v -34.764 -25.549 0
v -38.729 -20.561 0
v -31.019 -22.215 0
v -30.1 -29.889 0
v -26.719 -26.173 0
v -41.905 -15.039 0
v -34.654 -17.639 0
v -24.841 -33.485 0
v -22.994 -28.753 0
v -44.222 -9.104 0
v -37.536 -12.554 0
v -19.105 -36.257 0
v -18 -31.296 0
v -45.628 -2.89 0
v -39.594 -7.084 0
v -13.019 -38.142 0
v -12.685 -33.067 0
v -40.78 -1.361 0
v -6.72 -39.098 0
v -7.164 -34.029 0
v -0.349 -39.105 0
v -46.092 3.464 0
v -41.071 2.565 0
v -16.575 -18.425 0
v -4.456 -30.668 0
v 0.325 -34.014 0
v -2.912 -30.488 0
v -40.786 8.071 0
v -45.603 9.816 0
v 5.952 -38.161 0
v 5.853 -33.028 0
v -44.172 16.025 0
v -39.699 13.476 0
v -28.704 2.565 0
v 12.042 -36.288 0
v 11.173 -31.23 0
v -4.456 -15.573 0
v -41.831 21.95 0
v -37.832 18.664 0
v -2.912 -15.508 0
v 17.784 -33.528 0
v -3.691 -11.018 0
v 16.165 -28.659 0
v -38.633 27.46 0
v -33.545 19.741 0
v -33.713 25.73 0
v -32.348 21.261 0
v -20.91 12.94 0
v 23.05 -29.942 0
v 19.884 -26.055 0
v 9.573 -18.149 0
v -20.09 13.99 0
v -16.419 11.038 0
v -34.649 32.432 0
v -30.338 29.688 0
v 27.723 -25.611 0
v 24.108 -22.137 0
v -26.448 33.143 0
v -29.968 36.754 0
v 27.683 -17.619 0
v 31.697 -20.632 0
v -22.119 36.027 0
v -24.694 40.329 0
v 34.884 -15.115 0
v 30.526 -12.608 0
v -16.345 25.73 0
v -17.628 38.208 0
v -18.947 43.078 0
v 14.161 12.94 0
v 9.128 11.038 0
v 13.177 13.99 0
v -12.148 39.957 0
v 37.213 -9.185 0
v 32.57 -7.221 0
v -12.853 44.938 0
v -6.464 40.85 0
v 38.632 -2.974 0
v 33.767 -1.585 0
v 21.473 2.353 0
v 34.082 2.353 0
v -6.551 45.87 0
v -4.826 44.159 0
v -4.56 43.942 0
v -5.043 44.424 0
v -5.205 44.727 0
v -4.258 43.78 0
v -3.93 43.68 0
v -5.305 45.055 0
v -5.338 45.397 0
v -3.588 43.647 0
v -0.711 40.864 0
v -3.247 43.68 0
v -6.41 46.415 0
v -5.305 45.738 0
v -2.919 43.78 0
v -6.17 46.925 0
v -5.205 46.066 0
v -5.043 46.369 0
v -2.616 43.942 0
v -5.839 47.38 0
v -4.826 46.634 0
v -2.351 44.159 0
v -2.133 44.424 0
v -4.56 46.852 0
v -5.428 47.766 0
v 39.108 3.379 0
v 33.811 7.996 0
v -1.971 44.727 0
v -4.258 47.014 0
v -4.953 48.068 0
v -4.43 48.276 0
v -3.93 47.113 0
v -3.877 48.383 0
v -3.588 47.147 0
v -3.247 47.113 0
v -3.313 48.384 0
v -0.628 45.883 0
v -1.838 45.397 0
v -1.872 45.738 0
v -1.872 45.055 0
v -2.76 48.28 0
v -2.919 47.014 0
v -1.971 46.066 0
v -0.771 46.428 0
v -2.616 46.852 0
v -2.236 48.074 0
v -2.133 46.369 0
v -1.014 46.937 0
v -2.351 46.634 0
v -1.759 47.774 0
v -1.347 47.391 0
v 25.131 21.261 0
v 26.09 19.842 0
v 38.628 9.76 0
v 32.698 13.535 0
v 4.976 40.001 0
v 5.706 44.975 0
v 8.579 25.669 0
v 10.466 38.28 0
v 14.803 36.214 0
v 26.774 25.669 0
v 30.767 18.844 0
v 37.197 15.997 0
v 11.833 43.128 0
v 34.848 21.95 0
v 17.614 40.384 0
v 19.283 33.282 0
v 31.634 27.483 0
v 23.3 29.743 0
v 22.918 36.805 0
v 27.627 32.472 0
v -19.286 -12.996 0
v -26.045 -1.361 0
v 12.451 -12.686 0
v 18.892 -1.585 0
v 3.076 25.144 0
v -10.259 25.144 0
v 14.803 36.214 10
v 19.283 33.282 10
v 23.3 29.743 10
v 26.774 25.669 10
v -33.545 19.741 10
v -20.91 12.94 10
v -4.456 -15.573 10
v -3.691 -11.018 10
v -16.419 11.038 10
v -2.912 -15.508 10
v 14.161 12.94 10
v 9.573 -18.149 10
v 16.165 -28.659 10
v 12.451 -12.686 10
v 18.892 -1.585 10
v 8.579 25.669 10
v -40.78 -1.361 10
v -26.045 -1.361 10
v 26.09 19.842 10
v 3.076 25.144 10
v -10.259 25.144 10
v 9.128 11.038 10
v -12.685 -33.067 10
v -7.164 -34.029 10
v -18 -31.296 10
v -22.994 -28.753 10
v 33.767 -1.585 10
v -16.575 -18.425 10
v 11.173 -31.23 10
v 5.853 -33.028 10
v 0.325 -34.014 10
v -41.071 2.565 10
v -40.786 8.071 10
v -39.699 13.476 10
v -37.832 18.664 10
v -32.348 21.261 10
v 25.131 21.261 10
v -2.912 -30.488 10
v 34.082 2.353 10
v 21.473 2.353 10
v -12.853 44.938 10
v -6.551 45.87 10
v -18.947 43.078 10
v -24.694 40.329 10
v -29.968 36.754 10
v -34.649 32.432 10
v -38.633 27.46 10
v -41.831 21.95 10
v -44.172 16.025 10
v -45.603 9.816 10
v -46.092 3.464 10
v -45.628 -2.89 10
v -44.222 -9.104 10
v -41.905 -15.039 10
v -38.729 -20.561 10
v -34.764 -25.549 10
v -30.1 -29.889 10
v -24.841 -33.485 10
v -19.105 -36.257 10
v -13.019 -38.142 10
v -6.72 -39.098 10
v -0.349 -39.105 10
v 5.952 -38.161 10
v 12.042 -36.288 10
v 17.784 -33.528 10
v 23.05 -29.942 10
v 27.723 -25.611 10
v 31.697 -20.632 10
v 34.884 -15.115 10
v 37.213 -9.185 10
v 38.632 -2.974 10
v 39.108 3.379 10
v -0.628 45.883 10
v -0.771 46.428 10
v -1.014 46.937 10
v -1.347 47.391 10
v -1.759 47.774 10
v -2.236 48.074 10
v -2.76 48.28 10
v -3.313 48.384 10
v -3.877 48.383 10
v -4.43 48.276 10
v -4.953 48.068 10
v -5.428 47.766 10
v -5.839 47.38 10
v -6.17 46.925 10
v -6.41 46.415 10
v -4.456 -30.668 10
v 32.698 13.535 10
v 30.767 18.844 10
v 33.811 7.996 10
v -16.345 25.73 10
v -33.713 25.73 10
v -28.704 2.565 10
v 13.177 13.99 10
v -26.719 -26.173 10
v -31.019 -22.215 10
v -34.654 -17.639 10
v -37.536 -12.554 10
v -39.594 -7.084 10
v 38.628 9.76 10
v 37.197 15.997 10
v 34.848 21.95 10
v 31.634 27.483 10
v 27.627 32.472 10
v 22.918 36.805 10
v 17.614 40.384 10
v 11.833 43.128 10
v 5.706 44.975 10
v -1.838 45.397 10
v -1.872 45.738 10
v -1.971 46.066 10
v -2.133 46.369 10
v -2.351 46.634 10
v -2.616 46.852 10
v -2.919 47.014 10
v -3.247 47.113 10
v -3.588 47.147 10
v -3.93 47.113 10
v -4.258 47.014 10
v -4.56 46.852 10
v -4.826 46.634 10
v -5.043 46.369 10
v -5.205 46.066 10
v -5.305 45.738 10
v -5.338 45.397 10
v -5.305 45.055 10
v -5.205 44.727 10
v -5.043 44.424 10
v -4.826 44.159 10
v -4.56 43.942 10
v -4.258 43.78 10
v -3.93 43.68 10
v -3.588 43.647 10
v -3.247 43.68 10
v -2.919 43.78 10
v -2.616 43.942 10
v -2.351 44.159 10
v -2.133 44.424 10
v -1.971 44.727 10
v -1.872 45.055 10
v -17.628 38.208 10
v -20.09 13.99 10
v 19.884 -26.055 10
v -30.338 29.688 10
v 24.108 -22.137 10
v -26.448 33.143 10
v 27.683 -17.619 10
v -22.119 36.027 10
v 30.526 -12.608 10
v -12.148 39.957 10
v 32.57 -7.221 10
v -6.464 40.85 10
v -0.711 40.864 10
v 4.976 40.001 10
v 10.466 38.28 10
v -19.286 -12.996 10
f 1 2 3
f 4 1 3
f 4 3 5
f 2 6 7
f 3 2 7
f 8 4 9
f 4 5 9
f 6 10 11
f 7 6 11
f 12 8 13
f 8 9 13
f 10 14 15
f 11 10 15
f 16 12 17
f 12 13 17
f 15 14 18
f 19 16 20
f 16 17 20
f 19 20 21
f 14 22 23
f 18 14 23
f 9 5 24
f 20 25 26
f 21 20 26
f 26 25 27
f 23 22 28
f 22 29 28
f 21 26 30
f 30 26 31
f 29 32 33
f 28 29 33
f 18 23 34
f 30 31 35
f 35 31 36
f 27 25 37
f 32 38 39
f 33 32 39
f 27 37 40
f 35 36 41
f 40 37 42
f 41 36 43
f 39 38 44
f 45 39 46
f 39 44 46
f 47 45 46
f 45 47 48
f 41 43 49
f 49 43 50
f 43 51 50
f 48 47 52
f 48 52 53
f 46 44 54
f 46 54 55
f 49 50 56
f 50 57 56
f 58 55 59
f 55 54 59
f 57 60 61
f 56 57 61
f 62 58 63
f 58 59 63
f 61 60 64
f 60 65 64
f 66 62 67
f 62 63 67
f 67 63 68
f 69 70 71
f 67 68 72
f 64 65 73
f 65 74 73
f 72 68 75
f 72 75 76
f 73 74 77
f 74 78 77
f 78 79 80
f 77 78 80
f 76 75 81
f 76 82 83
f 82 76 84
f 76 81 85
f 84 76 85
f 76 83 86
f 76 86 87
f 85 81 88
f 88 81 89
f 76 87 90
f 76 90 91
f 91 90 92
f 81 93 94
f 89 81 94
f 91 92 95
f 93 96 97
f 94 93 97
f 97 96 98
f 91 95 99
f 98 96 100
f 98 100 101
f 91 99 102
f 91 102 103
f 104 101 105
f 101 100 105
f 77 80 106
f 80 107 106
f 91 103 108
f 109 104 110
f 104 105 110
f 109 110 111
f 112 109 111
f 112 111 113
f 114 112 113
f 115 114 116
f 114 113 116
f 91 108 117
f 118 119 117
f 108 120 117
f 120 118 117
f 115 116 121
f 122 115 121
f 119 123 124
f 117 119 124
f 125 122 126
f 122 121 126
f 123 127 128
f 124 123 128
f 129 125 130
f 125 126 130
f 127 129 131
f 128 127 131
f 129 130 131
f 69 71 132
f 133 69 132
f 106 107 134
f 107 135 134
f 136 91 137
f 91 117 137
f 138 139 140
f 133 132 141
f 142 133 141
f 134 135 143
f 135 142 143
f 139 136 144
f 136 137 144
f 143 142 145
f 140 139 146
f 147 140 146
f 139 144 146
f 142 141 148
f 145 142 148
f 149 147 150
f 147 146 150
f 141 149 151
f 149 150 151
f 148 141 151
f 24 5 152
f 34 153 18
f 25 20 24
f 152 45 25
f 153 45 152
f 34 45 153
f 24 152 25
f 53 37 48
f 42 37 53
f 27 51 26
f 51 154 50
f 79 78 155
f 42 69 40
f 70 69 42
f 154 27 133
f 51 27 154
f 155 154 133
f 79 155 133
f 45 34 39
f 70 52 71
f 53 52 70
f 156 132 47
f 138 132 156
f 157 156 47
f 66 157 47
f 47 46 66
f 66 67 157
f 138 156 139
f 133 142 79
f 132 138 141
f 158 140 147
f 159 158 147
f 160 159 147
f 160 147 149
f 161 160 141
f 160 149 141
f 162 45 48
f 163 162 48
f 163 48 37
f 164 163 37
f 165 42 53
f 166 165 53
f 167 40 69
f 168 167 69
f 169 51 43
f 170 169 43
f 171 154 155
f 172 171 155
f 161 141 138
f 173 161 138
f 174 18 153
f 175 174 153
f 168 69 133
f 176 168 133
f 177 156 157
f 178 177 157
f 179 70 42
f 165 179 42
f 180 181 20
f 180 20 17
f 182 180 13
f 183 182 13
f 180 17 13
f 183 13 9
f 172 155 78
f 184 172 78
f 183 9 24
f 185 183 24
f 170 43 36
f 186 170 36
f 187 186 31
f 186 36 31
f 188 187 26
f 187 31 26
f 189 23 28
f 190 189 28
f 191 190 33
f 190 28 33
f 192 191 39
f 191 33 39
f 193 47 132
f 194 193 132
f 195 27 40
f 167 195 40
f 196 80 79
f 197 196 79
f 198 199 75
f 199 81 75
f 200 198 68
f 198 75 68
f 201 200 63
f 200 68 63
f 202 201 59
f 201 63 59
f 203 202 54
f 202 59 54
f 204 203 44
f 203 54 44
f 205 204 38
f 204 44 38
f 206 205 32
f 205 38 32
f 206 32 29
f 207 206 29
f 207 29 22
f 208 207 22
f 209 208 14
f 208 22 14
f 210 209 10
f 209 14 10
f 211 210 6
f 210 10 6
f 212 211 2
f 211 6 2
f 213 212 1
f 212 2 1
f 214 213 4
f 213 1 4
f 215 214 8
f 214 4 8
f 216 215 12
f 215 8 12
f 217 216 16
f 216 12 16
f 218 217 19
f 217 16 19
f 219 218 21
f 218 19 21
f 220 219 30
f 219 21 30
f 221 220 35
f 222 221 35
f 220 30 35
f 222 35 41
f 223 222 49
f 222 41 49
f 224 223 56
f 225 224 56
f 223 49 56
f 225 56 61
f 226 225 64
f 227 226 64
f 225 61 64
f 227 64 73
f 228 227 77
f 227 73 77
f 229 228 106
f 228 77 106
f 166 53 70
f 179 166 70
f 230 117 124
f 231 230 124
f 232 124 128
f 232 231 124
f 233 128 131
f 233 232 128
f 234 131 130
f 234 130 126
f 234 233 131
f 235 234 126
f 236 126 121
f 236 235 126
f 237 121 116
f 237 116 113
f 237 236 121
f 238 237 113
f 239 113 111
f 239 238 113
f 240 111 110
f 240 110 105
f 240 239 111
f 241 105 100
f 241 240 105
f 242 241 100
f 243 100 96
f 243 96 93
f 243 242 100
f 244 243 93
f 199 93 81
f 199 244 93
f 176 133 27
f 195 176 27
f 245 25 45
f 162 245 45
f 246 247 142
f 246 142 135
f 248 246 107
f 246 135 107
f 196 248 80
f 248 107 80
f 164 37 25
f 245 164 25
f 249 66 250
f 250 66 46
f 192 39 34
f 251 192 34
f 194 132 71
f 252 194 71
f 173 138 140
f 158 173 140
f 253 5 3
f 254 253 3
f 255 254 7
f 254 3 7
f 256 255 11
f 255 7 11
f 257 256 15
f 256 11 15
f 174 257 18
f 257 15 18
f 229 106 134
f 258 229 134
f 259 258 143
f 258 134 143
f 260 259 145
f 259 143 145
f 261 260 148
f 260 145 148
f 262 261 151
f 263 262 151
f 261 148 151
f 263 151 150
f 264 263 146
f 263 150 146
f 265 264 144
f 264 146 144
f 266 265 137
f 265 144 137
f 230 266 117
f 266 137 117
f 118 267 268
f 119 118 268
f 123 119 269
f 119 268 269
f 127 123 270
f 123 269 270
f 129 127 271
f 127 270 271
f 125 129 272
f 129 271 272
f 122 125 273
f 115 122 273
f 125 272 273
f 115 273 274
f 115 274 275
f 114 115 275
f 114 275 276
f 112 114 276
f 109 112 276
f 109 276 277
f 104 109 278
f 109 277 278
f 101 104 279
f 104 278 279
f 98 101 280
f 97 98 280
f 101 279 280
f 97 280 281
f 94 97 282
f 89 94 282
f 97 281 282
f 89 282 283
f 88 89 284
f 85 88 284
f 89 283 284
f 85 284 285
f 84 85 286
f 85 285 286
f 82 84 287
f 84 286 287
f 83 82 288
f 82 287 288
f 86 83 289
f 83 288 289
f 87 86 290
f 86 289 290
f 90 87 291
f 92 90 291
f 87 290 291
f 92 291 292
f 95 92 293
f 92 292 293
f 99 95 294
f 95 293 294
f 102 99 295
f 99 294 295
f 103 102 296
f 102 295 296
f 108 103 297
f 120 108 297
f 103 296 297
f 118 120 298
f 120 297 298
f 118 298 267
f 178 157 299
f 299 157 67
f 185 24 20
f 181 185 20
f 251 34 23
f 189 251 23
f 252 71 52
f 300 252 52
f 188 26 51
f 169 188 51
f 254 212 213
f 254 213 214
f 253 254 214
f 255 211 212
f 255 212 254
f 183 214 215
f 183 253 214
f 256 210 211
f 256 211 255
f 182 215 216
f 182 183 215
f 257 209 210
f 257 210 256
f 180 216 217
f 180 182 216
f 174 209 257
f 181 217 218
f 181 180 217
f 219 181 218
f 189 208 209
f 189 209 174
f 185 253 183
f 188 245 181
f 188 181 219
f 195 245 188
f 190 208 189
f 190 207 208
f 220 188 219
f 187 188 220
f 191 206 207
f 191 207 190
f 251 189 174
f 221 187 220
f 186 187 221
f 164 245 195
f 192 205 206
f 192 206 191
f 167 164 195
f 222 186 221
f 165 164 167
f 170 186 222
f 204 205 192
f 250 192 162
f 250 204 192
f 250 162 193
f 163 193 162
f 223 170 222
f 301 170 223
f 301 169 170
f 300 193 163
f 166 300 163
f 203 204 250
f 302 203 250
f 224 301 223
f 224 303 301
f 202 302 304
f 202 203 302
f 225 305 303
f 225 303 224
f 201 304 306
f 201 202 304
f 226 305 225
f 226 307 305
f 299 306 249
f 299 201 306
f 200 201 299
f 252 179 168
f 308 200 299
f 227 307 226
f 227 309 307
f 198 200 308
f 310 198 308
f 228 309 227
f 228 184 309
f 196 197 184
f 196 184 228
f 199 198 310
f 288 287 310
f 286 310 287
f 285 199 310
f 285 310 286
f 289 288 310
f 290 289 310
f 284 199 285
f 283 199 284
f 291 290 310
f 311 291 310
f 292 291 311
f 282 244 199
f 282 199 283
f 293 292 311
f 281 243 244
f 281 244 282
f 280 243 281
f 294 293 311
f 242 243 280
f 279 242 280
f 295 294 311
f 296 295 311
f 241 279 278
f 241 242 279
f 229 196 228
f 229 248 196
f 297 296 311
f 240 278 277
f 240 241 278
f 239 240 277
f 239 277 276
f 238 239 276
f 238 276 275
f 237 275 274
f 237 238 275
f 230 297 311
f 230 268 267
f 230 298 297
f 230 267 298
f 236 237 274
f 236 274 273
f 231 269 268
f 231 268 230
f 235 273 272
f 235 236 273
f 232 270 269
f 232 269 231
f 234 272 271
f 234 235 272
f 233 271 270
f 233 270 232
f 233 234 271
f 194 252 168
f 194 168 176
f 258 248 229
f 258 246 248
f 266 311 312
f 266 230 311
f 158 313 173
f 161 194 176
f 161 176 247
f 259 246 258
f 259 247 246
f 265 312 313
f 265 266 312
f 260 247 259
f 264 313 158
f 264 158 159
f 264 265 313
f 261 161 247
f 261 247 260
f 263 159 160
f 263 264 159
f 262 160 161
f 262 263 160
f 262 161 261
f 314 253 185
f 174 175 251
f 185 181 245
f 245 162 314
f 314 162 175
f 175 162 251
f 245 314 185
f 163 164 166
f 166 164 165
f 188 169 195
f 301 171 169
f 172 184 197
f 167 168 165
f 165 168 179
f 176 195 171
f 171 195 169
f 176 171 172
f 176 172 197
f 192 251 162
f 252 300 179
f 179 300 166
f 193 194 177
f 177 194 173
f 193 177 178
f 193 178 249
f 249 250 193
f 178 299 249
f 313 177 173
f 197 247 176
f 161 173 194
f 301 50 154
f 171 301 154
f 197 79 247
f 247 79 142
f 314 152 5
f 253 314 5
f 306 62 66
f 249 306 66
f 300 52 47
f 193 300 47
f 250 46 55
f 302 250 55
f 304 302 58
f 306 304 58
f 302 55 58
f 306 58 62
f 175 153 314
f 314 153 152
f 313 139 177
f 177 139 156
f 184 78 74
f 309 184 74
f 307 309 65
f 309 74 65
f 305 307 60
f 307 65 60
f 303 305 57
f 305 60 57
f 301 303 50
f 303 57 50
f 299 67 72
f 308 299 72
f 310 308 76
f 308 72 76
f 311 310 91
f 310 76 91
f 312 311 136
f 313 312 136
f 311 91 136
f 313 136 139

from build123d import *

# Parameters (mm, degrees)
F0_R     = 42.600351
F1_DEPTH = 10
F2_R     = 3
F3_DEPTH = 10
F4_R     = 1.75
F5_DEPTH = 10


with BuildPart() as f1:
    # F0 (on Top) → F1 (new body)
    with BuildSketch(Plane.XY):
        with Locations((-3.491996, 3.379424)):
            Circle(F0_R)
        with BuildLine():
            ThreePointArc((-7.164283, -34.028625), (-15.375556, -32.280481), (-22.994009, -28.753415))
            Line((-22.994009, -28.753415), (-16.57502, -18.424874))
            Line((-16.57502, -18.424874), (-7.164283, -34.028625))
        make_face(mode=Mode.SUBTRACT)
        with BuildLine():
            ThreePointArc((-26.719134, -26.173036), (-36.194012, -15.152333), (-40.779743, -1.361021))
            Line((-40.779743, -1.361021), (-26.045103, -1.361021))
            Line((-26.045103, -1.361021), (-19.285653, -12.996144))
            Line((-19.285653, -12.996144), (-26.719134, -26.173036))
        make_face(mode=Mode.SUBTRACT)
        Polygon((-4.45611, -30.667817), (-33.544526, 19.741029), (-20.909635, 12.940229), (-4.45611, -15.572951), align=None, mode=Mode.SUBTRACT)
        Polygon((-3.691398, -11.018276), (-16.418712, 11.037555), (9.128165, 11.037555), align=None, mode=Mode.SUBTRACT)
        with BuildLine():
            ThreePointArc((16.165116, -28.658769), (8.54654, -32.228461), (0.324819, -34.014155))
            Line((0.324819, -34.014155), (9.573368, -18.149028))
            Line((9.573368, -18.149028), (16.165116, -28.658769))
        make_face(mode=Mode.SUBTRACT)
        Polygon((-2.912057, -15.508026), (14.16059, 12.940229), (26.090452, 19.84215), (-2.912057, -30.488131), align=None, mode=Mode.SUBTRACT)
        with BuildLine():
            Line((19.884041, -26.055397), (12.450778, -12.686017))
            Line((12.450778, -12.686017), (18.892192, -1.584855))
            Line((18.892192, -1.584855), (33.766611, -1.584855))
            ThreePointArc((33.766611, -1.584855), (29.201151, -15.167973), (19.884041, -26.055397))
        make_face(mode=Mode.SUBTRACT)
        with BuildLine():
            ThreePointArc((-41.071032, 2.564623), (-40.341471, 10.793199), (-37.83205, 18.663683))
            Line((-37.83205, 18.663683), (-28.703782, 2.564623))
            Line((-28.703782, 2.564623), (-41.071032, 2.564623))
        make_face(mode=Mode.SUBTRACT)
        Polygon((-20.089835, 13.989503), (-32.347553, 21.261031), (25.130622, 21.261031), (13.177481, 13.989503), align=None, mode=Mode.SUBTRACT)
        with BuildLine():
            Line((-16.344654, 25.73009), (-33.712777, 25.73009))
            ThreePointArc((-33.712777, 25.73009), (-28.452661, 31.483037), (-22.119012, 36.027275))
            Line((-22.119012, 36.027275), (-16.344654, 25.73009))
        make_face(mode=Mode.SUBTRACT)
        with BuildLine():
            Line((-10.259116, 25.144359), (-17.628212, 38.207793))
            ThreePointArc((-17.628212, 38.207793), (-3.588235, 40.96717), (10.465687, 38.279725))
            Line((10.465687, 38.279725), (3.075884, 25.144359))
            Line((3.075884, 25.144359), (-10.259116, 25.144359))
        make_face(mode=Mode.SUBTRACT)
        with BuildLine():
            ThreePointArc((30.767179, 18.844119), (33.358844, 10.786409), (34.081858, 2.353102))
            Line((34.081858, 2.353102), (21.473352, 2.353102))
            Line((21.473352, 2.353102), (30.767179, 18.844119))
        make_face(mode=Mode.SUBTRACT)
        with BuildLine():
            ThreePointArc((14.803284, 36.214323), (21.354359, 31.584149), (26.773684, 25.669252))
            Line((26.773684, 25.669252), (8.578651, 25.669252))
            Line((8.578651, 25.669252), (14.803284, 36.214323))
        make_face(mode=Mode.SUBTRACT)
    extrude(amount=F1_DEPTH)

    # F2 (on face) → F3 (join, through all)
    with BuildSketch(Plane.XY.offset(10)):
        with Locations((-3.588235, 45.396723)):
            Circle(F2_R)
    extrude(amount=-F3_DEPTH)

    # F4 (on face) → F5 (cut, through all)
    with BuildSketch(Plane.XY.offset(10)):
        with Locations((-3.588235, 45.396723)):
            Circle(F4_R)
    extrude(amount=-F5_DEPTH, mode=Mode.SUBTRACT)


solid = f1.part
